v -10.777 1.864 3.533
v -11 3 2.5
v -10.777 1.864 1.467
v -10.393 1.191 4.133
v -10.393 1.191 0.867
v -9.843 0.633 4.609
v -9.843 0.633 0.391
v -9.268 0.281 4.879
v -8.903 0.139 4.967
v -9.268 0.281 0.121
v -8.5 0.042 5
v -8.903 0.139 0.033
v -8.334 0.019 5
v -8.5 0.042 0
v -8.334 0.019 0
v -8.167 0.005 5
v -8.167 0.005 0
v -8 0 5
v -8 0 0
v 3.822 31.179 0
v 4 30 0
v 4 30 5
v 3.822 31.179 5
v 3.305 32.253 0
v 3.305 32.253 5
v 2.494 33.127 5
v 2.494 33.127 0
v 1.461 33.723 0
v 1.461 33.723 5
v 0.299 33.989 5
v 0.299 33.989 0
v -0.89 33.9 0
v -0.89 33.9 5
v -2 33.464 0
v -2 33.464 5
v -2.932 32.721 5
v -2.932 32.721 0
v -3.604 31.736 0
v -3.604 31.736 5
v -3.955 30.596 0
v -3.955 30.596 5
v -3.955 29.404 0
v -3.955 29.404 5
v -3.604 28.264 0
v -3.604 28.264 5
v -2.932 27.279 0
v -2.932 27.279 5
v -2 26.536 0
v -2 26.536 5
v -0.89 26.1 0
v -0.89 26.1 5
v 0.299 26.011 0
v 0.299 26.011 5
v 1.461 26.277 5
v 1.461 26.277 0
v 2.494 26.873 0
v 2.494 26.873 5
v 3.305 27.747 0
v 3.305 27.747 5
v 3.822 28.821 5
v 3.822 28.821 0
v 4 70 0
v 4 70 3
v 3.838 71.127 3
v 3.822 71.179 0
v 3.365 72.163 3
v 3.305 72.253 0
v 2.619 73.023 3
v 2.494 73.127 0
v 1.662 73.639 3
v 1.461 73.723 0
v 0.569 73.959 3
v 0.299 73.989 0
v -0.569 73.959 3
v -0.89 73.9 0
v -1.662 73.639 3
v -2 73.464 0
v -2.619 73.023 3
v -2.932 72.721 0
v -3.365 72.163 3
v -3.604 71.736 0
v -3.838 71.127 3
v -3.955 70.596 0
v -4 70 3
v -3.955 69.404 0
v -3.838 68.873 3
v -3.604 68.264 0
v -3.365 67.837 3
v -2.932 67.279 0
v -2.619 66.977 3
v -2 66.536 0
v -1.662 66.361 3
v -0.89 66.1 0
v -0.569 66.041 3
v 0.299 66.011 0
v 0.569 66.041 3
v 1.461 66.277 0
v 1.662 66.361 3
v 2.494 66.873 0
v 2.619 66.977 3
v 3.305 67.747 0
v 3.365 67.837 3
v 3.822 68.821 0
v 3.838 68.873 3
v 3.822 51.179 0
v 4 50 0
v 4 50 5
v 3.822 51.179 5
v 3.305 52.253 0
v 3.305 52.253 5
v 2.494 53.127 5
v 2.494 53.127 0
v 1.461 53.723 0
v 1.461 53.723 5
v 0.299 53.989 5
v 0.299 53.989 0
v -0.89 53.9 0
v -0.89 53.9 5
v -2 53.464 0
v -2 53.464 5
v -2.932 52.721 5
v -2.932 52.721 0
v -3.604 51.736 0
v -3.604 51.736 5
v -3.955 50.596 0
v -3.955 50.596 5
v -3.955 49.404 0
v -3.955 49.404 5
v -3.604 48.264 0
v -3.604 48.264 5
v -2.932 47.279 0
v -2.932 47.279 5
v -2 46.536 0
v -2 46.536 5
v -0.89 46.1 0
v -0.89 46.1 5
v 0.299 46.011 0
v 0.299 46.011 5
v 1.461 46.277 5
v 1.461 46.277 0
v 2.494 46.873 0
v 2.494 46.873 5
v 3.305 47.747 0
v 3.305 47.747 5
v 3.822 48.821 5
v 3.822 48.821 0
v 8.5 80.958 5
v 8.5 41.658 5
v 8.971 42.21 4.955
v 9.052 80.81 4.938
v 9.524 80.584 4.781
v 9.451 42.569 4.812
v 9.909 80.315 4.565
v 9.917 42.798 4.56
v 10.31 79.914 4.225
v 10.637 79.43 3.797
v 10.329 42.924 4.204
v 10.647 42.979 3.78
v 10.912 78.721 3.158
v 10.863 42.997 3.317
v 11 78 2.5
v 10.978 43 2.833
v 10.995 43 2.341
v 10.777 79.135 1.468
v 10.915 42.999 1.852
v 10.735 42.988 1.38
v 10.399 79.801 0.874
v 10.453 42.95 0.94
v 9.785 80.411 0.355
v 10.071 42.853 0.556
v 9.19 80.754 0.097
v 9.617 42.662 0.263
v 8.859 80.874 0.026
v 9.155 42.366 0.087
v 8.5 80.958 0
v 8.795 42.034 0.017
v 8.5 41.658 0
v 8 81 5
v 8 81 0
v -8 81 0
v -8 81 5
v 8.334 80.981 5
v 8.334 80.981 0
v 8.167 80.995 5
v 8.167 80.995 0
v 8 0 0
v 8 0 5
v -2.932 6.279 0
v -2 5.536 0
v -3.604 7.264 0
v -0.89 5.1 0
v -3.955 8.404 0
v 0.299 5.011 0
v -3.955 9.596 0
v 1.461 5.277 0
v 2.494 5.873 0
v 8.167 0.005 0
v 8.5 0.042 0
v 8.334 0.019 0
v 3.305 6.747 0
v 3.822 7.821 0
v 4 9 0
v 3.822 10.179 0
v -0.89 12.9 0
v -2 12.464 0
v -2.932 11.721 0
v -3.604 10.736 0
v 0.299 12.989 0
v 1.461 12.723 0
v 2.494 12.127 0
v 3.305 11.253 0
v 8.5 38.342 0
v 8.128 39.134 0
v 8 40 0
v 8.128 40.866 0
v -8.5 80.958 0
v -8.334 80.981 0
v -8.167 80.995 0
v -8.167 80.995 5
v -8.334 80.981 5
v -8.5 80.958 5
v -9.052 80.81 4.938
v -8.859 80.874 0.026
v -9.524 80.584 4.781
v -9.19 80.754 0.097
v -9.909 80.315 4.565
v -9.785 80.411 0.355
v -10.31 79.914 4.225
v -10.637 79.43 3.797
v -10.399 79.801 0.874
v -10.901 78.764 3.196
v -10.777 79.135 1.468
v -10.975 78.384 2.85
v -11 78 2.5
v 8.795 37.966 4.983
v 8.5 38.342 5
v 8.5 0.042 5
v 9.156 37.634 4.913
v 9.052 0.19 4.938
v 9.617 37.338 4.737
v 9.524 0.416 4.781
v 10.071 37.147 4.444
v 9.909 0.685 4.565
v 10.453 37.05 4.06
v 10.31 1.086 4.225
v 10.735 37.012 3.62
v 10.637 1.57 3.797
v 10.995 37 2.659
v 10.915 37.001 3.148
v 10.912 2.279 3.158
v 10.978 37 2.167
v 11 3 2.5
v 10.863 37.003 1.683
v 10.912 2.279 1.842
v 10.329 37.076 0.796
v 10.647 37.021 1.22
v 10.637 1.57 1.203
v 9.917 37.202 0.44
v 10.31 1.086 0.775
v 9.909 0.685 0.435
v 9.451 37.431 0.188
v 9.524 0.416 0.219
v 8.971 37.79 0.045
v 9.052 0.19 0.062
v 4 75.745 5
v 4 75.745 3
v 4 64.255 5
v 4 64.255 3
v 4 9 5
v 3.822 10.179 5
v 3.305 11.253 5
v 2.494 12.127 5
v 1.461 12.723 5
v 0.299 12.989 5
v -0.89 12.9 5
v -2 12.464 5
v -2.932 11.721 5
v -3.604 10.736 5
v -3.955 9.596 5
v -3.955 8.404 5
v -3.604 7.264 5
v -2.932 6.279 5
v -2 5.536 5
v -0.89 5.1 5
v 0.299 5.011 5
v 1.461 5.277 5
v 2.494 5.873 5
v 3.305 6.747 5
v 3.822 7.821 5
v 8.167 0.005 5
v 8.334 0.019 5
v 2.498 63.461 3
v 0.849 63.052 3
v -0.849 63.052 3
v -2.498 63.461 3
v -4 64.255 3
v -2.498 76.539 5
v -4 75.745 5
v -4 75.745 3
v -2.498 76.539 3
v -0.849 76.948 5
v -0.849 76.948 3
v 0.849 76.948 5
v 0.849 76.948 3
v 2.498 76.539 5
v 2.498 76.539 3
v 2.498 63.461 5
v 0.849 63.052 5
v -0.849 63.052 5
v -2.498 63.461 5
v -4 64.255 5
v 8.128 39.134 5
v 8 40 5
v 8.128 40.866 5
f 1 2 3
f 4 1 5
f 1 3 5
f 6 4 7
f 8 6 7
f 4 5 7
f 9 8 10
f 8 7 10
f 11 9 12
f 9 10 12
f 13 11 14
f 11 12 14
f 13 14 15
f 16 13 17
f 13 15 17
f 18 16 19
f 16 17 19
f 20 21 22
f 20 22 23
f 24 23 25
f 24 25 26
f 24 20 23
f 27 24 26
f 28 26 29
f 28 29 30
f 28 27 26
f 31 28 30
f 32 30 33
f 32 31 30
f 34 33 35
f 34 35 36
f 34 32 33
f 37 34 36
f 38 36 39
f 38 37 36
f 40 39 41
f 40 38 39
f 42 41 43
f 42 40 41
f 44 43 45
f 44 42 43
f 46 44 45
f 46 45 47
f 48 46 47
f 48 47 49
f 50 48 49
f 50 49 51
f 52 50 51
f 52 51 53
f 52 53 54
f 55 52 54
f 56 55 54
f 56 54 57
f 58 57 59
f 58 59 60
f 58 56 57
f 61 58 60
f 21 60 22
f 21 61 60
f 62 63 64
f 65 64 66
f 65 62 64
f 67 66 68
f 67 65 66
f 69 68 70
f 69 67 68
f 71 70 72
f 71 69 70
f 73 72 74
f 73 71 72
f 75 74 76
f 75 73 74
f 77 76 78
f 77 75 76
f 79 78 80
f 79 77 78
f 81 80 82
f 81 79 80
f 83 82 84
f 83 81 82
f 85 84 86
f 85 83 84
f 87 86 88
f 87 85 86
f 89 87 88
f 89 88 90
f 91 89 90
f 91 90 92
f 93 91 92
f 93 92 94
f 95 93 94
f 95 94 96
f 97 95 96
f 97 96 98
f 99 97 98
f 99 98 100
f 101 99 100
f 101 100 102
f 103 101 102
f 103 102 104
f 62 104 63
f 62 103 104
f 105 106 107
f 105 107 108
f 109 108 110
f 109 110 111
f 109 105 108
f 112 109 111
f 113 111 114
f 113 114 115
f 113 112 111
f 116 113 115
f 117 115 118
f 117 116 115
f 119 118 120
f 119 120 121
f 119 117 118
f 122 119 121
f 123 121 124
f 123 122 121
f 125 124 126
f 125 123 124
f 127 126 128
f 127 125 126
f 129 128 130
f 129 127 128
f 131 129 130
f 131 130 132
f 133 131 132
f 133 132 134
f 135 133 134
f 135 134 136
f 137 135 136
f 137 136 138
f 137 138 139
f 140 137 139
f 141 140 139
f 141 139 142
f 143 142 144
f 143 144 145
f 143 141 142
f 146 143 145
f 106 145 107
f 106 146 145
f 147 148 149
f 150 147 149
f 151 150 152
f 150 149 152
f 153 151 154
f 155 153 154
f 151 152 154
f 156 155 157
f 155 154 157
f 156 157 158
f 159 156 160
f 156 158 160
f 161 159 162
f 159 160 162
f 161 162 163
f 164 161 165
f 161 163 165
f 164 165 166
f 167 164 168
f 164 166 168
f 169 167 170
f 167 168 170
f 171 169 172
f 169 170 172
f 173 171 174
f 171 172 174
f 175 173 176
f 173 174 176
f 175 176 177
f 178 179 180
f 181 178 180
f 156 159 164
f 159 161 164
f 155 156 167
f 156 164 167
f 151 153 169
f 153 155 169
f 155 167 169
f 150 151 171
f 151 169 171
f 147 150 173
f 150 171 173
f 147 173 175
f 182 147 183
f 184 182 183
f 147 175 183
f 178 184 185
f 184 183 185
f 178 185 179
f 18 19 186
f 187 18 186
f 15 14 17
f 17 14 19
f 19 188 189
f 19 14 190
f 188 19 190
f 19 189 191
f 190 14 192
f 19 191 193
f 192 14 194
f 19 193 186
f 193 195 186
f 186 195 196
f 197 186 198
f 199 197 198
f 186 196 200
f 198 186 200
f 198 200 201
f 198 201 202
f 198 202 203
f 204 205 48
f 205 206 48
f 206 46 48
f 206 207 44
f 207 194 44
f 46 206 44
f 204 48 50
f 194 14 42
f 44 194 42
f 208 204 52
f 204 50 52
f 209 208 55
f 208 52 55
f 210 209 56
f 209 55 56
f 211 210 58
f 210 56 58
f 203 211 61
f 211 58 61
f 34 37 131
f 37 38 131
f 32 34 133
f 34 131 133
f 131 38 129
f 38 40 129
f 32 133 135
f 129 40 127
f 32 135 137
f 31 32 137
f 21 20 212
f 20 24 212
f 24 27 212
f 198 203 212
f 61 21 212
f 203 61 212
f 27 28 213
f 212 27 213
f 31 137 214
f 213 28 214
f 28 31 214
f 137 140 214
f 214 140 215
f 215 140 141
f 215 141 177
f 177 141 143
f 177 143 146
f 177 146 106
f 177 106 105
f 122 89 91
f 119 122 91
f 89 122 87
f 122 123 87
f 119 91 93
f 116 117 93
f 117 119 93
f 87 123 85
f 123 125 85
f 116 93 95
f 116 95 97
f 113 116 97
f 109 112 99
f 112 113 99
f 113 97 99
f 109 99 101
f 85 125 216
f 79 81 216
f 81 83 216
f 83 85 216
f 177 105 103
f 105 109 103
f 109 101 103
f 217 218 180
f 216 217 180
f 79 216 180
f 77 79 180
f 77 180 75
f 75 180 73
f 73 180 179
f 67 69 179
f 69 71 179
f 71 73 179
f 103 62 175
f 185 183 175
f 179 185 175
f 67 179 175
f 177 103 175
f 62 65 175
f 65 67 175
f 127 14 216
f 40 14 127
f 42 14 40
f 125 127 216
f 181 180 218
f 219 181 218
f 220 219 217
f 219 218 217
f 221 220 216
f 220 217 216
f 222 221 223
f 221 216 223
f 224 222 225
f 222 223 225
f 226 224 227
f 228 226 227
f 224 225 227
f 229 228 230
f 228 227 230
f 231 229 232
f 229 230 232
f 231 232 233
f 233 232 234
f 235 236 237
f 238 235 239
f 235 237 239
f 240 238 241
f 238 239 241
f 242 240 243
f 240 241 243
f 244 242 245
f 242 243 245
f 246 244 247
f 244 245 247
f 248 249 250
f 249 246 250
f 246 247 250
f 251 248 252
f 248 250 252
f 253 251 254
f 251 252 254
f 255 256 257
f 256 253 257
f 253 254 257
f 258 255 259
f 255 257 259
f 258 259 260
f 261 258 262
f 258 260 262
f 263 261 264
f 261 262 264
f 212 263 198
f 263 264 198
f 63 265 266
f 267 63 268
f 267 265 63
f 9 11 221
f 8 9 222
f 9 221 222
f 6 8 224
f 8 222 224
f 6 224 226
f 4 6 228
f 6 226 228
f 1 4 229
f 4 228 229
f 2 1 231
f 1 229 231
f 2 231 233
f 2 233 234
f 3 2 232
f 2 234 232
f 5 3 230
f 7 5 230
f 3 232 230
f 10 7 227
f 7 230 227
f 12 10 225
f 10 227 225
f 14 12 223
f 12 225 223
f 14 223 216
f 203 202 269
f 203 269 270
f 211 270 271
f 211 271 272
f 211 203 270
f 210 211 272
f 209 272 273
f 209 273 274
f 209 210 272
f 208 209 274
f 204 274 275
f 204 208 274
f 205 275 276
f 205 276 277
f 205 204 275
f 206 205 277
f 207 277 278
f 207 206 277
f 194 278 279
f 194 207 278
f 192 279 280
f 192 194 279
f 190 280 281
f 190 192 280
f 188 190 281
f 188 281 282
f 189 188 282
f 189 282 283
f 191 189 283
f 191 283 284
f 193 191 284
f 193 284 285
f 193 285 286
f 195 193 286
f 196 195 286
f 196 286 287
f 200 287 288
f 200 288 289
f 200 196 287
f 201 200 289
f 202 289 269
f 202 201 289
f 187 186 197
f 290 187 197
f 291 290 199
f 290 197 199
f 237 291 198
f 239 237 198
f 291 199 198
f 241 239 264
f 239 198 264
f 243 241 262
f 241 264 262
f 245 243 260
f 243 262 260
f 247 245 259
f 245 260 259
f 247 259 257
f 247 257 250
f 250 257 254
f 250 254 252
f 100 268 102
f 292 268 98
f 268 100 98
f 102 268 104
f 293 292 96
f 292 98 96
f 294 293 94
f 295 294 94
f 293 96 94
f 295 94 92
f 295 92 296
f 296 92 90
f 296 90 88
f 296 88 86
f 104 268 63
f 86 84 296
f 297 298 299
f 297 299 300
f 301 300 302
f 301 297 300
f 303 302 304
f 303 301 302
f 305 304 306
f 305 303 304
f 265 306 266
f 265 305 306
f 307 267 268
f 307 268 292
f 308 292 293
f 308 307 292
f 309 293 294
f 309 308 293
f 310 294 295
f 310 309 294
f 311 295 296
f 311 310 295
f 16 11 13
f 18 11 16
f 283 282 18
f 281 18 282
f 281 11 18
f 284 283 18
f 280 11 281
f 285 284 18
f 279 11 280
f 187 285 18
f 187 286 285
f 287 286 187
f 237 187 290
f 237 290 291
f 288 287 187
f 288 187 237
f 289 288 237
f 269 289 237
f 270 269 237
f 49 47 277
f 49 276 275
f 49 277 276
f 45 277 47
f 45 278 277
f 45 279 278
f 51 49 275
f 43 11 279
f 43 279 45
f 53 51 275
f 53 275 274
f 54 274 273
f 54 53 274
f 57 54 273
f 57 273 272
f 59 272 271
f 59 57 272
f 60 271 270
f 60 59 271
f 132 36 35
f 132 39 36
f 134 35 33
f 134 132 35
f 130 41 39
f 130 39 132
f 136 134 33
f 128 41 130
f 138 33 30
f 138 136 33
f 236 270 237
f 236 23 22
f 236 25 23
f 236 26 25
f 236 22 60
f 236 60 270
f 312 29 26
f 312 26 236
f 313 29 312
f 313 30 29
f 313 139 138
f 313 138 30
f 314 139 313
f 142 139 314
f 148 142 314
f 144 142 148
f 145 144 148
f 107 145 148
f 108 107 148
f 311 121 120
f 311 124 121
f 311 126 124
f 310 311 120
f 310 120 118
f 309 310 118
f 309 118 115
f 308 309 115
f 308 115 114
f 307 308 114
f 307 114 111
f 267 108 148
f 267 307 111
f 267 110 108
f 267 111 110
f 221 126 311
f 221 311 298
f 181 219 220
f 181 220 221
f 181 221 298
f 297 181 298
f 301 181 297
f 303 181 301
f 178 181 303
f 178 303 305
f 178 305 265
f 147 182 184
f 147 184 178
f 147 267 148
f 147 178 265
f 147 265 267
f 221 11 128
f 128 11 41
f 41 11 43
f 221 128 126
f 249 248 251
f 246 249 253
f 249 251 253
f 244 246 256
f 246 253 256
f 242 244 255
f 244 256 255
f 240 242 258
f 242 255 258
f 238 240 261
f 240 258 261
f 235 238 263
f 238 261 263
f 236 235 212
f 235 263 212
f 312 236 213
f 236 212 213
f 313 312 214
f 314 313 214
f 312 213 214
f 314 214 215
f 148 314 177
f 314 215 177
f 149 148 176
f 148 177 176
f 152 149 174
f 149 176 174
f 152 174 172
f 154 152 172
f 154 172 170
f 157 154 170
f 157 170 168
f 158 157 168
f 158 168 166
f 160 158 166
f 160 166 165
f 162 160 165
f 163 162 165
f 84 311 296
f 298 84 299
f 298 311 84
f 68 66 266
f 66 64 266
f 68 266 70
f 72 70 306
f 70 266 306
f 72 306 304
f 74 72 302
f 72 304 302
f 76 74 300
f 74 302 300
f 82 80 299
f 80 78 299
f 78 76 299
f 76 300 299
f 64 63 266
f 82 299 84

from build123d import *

# Parameters (mm, degrees)
ESQUISSE1_R             = 4
EXTRUSION1_DEPTH        = 5
ENL_V_MAT_EXTRU_1_DEPTH = 2
CONG_1_R                = 2.5


with BuildPart() as part:
    # Esquisse1 → Extrusion1 (new body)
    with BuildSketch(Plane.XY):
        with BuildLine():
            Line((-8, 0), (8, 0))
            ThreePointArc((8, 0), (10.121320344, 0.878679656), (11, 3))
            Line((11, 3), (11, 37))
            ThreePointArc((11, 37), (8, 40), (11, 43))
            Line((11, 43), (11, 78))
            ThreePointArc((11, 78), (10.121320344, 80.121320344), (8, 81))
            Line((8, 81), (-8, 81))
            ThreePointArc((-8, 81), (-10.121320344, 80.121320344), (-11, 78))
            Line((-11, 78), (-11, 3))
            ThreePointArc((-11, 3), (-10.121320344, 0.878679656), (-8, 0))
        make_face()
        with Locations((0, 9)):
            Circle(ESQUISSE1_R, mode=Mode.SUBTRACT)
        with Locations((0, 30)):
            Circle(ESQUISSE1_R, mode=Mode.SUBTRACT)
        with Locations((0, 50)):
            Circle(ESQUISSE1_R, mode=Mode.SUBTRACT)
        with Locations((0, 70)):
            Circle(ESQUISSE1_R, mode=Mode.SUBTRACT)
    extrude(amount=EXTRUSION1_DEPTH)

    # Esquisse2 → Enlèv. mat.-Extru.1 (cut)
    with BuildSketch(Plane.XY.offset(5)):
        with BuildLine():
            Line((4, 75.744562647), (4, 64.255437353))
            ThreePointArc((4, 64.255437353), (0, 63), (-4, 64.255437353))
            Line((-4, 64.255437353), (-4, 75.744562647))
            ThreePointArc((-4, 75.744562647), (0, 77), (4, 75.744562647))
        make_face()
    extrude(amount=-ENL_V_MAT_EXTRU_1_DEPTH, mode=Mode.SUBTRACT)

    # Congé1
    # the kernel refuses this fillet: 2.5 mm, written as the material it takes off along each edge
    with BuildSketch(Plane(origin=(11, -3.25, 0), x_dir=(0, 0, 1), z_dir=(0, 1, 0)), Plane(origin=(11, -3.25, 5), x_dir=(-1, 0, 0), z_dir=(0, 1, 0))) as cong_1_piece_1:
        with BuildLine():
            CenterArc((CONG_1_R, -CONG_1_R), CONG_1_R, 90, 90)
            Line((0, -CONG_1_R), (0, 0))
            Line((0, 0), (CONG_1_R, 0))
        make_face()
    extrude(amount=46.5, mode=Mode.SUBTRACT)
    with BuildSketch(Plane(origin=(-11, 84.25, 0), x_dir=(0, 0, 1), z_dir=(0, -1, 0))) as cong_1_piece_2:
        with BuildLine():
            CenterArc((CONG_1_R, -CONG_1_R), CONG_1_R, 90, 90)
            Line((0, -CONG_1_R), (0, 0))
            Line((0, 0), (CONG_1_R, 0))
        make_face()
    extrude(amount=87.5, mode=Mode.SUBTRACT)
    with BuildSketch(Plane(origin=(-11, 84.25, 5), x_dir=(0, 0, -1), z_dir=(0, -1, 0))) as cong_1_piece_3:
        with BuildLine():
            CenterArc((CONG_1_R, CONG_1_R), CONG_1_R, 180, 90)
            Line((0, CONG_1_R), (0, 0))
            Line((0, 0), (CONG_1_R, 0))
        make_face()
    extrude(amount=87.5, mode=Mode.SUBTRACT)
    with BuildSketch(Plane(origin=(11, 36.75, 0), x_dir=(0, 0, 1), z_dir=(0, 1, 0)), Plane(origin=(11, 36.75, 5), x_dir=(-1, 0, 0), z_dir=(0, 1, 0))) as cong_1_piece_4:
        with BuildLine():
            CenterArc((CONG_1_R, -CONG_1_R), CONG_1_R, 90, 90)
            Line((0, -CONG_1_R), (0, 0))
            Line((0, 0), (CONG_1_R, 0))
        make_face()
    extrude(amount=47.5, mode=Mode.SUBTRACT)


solid = part.part
